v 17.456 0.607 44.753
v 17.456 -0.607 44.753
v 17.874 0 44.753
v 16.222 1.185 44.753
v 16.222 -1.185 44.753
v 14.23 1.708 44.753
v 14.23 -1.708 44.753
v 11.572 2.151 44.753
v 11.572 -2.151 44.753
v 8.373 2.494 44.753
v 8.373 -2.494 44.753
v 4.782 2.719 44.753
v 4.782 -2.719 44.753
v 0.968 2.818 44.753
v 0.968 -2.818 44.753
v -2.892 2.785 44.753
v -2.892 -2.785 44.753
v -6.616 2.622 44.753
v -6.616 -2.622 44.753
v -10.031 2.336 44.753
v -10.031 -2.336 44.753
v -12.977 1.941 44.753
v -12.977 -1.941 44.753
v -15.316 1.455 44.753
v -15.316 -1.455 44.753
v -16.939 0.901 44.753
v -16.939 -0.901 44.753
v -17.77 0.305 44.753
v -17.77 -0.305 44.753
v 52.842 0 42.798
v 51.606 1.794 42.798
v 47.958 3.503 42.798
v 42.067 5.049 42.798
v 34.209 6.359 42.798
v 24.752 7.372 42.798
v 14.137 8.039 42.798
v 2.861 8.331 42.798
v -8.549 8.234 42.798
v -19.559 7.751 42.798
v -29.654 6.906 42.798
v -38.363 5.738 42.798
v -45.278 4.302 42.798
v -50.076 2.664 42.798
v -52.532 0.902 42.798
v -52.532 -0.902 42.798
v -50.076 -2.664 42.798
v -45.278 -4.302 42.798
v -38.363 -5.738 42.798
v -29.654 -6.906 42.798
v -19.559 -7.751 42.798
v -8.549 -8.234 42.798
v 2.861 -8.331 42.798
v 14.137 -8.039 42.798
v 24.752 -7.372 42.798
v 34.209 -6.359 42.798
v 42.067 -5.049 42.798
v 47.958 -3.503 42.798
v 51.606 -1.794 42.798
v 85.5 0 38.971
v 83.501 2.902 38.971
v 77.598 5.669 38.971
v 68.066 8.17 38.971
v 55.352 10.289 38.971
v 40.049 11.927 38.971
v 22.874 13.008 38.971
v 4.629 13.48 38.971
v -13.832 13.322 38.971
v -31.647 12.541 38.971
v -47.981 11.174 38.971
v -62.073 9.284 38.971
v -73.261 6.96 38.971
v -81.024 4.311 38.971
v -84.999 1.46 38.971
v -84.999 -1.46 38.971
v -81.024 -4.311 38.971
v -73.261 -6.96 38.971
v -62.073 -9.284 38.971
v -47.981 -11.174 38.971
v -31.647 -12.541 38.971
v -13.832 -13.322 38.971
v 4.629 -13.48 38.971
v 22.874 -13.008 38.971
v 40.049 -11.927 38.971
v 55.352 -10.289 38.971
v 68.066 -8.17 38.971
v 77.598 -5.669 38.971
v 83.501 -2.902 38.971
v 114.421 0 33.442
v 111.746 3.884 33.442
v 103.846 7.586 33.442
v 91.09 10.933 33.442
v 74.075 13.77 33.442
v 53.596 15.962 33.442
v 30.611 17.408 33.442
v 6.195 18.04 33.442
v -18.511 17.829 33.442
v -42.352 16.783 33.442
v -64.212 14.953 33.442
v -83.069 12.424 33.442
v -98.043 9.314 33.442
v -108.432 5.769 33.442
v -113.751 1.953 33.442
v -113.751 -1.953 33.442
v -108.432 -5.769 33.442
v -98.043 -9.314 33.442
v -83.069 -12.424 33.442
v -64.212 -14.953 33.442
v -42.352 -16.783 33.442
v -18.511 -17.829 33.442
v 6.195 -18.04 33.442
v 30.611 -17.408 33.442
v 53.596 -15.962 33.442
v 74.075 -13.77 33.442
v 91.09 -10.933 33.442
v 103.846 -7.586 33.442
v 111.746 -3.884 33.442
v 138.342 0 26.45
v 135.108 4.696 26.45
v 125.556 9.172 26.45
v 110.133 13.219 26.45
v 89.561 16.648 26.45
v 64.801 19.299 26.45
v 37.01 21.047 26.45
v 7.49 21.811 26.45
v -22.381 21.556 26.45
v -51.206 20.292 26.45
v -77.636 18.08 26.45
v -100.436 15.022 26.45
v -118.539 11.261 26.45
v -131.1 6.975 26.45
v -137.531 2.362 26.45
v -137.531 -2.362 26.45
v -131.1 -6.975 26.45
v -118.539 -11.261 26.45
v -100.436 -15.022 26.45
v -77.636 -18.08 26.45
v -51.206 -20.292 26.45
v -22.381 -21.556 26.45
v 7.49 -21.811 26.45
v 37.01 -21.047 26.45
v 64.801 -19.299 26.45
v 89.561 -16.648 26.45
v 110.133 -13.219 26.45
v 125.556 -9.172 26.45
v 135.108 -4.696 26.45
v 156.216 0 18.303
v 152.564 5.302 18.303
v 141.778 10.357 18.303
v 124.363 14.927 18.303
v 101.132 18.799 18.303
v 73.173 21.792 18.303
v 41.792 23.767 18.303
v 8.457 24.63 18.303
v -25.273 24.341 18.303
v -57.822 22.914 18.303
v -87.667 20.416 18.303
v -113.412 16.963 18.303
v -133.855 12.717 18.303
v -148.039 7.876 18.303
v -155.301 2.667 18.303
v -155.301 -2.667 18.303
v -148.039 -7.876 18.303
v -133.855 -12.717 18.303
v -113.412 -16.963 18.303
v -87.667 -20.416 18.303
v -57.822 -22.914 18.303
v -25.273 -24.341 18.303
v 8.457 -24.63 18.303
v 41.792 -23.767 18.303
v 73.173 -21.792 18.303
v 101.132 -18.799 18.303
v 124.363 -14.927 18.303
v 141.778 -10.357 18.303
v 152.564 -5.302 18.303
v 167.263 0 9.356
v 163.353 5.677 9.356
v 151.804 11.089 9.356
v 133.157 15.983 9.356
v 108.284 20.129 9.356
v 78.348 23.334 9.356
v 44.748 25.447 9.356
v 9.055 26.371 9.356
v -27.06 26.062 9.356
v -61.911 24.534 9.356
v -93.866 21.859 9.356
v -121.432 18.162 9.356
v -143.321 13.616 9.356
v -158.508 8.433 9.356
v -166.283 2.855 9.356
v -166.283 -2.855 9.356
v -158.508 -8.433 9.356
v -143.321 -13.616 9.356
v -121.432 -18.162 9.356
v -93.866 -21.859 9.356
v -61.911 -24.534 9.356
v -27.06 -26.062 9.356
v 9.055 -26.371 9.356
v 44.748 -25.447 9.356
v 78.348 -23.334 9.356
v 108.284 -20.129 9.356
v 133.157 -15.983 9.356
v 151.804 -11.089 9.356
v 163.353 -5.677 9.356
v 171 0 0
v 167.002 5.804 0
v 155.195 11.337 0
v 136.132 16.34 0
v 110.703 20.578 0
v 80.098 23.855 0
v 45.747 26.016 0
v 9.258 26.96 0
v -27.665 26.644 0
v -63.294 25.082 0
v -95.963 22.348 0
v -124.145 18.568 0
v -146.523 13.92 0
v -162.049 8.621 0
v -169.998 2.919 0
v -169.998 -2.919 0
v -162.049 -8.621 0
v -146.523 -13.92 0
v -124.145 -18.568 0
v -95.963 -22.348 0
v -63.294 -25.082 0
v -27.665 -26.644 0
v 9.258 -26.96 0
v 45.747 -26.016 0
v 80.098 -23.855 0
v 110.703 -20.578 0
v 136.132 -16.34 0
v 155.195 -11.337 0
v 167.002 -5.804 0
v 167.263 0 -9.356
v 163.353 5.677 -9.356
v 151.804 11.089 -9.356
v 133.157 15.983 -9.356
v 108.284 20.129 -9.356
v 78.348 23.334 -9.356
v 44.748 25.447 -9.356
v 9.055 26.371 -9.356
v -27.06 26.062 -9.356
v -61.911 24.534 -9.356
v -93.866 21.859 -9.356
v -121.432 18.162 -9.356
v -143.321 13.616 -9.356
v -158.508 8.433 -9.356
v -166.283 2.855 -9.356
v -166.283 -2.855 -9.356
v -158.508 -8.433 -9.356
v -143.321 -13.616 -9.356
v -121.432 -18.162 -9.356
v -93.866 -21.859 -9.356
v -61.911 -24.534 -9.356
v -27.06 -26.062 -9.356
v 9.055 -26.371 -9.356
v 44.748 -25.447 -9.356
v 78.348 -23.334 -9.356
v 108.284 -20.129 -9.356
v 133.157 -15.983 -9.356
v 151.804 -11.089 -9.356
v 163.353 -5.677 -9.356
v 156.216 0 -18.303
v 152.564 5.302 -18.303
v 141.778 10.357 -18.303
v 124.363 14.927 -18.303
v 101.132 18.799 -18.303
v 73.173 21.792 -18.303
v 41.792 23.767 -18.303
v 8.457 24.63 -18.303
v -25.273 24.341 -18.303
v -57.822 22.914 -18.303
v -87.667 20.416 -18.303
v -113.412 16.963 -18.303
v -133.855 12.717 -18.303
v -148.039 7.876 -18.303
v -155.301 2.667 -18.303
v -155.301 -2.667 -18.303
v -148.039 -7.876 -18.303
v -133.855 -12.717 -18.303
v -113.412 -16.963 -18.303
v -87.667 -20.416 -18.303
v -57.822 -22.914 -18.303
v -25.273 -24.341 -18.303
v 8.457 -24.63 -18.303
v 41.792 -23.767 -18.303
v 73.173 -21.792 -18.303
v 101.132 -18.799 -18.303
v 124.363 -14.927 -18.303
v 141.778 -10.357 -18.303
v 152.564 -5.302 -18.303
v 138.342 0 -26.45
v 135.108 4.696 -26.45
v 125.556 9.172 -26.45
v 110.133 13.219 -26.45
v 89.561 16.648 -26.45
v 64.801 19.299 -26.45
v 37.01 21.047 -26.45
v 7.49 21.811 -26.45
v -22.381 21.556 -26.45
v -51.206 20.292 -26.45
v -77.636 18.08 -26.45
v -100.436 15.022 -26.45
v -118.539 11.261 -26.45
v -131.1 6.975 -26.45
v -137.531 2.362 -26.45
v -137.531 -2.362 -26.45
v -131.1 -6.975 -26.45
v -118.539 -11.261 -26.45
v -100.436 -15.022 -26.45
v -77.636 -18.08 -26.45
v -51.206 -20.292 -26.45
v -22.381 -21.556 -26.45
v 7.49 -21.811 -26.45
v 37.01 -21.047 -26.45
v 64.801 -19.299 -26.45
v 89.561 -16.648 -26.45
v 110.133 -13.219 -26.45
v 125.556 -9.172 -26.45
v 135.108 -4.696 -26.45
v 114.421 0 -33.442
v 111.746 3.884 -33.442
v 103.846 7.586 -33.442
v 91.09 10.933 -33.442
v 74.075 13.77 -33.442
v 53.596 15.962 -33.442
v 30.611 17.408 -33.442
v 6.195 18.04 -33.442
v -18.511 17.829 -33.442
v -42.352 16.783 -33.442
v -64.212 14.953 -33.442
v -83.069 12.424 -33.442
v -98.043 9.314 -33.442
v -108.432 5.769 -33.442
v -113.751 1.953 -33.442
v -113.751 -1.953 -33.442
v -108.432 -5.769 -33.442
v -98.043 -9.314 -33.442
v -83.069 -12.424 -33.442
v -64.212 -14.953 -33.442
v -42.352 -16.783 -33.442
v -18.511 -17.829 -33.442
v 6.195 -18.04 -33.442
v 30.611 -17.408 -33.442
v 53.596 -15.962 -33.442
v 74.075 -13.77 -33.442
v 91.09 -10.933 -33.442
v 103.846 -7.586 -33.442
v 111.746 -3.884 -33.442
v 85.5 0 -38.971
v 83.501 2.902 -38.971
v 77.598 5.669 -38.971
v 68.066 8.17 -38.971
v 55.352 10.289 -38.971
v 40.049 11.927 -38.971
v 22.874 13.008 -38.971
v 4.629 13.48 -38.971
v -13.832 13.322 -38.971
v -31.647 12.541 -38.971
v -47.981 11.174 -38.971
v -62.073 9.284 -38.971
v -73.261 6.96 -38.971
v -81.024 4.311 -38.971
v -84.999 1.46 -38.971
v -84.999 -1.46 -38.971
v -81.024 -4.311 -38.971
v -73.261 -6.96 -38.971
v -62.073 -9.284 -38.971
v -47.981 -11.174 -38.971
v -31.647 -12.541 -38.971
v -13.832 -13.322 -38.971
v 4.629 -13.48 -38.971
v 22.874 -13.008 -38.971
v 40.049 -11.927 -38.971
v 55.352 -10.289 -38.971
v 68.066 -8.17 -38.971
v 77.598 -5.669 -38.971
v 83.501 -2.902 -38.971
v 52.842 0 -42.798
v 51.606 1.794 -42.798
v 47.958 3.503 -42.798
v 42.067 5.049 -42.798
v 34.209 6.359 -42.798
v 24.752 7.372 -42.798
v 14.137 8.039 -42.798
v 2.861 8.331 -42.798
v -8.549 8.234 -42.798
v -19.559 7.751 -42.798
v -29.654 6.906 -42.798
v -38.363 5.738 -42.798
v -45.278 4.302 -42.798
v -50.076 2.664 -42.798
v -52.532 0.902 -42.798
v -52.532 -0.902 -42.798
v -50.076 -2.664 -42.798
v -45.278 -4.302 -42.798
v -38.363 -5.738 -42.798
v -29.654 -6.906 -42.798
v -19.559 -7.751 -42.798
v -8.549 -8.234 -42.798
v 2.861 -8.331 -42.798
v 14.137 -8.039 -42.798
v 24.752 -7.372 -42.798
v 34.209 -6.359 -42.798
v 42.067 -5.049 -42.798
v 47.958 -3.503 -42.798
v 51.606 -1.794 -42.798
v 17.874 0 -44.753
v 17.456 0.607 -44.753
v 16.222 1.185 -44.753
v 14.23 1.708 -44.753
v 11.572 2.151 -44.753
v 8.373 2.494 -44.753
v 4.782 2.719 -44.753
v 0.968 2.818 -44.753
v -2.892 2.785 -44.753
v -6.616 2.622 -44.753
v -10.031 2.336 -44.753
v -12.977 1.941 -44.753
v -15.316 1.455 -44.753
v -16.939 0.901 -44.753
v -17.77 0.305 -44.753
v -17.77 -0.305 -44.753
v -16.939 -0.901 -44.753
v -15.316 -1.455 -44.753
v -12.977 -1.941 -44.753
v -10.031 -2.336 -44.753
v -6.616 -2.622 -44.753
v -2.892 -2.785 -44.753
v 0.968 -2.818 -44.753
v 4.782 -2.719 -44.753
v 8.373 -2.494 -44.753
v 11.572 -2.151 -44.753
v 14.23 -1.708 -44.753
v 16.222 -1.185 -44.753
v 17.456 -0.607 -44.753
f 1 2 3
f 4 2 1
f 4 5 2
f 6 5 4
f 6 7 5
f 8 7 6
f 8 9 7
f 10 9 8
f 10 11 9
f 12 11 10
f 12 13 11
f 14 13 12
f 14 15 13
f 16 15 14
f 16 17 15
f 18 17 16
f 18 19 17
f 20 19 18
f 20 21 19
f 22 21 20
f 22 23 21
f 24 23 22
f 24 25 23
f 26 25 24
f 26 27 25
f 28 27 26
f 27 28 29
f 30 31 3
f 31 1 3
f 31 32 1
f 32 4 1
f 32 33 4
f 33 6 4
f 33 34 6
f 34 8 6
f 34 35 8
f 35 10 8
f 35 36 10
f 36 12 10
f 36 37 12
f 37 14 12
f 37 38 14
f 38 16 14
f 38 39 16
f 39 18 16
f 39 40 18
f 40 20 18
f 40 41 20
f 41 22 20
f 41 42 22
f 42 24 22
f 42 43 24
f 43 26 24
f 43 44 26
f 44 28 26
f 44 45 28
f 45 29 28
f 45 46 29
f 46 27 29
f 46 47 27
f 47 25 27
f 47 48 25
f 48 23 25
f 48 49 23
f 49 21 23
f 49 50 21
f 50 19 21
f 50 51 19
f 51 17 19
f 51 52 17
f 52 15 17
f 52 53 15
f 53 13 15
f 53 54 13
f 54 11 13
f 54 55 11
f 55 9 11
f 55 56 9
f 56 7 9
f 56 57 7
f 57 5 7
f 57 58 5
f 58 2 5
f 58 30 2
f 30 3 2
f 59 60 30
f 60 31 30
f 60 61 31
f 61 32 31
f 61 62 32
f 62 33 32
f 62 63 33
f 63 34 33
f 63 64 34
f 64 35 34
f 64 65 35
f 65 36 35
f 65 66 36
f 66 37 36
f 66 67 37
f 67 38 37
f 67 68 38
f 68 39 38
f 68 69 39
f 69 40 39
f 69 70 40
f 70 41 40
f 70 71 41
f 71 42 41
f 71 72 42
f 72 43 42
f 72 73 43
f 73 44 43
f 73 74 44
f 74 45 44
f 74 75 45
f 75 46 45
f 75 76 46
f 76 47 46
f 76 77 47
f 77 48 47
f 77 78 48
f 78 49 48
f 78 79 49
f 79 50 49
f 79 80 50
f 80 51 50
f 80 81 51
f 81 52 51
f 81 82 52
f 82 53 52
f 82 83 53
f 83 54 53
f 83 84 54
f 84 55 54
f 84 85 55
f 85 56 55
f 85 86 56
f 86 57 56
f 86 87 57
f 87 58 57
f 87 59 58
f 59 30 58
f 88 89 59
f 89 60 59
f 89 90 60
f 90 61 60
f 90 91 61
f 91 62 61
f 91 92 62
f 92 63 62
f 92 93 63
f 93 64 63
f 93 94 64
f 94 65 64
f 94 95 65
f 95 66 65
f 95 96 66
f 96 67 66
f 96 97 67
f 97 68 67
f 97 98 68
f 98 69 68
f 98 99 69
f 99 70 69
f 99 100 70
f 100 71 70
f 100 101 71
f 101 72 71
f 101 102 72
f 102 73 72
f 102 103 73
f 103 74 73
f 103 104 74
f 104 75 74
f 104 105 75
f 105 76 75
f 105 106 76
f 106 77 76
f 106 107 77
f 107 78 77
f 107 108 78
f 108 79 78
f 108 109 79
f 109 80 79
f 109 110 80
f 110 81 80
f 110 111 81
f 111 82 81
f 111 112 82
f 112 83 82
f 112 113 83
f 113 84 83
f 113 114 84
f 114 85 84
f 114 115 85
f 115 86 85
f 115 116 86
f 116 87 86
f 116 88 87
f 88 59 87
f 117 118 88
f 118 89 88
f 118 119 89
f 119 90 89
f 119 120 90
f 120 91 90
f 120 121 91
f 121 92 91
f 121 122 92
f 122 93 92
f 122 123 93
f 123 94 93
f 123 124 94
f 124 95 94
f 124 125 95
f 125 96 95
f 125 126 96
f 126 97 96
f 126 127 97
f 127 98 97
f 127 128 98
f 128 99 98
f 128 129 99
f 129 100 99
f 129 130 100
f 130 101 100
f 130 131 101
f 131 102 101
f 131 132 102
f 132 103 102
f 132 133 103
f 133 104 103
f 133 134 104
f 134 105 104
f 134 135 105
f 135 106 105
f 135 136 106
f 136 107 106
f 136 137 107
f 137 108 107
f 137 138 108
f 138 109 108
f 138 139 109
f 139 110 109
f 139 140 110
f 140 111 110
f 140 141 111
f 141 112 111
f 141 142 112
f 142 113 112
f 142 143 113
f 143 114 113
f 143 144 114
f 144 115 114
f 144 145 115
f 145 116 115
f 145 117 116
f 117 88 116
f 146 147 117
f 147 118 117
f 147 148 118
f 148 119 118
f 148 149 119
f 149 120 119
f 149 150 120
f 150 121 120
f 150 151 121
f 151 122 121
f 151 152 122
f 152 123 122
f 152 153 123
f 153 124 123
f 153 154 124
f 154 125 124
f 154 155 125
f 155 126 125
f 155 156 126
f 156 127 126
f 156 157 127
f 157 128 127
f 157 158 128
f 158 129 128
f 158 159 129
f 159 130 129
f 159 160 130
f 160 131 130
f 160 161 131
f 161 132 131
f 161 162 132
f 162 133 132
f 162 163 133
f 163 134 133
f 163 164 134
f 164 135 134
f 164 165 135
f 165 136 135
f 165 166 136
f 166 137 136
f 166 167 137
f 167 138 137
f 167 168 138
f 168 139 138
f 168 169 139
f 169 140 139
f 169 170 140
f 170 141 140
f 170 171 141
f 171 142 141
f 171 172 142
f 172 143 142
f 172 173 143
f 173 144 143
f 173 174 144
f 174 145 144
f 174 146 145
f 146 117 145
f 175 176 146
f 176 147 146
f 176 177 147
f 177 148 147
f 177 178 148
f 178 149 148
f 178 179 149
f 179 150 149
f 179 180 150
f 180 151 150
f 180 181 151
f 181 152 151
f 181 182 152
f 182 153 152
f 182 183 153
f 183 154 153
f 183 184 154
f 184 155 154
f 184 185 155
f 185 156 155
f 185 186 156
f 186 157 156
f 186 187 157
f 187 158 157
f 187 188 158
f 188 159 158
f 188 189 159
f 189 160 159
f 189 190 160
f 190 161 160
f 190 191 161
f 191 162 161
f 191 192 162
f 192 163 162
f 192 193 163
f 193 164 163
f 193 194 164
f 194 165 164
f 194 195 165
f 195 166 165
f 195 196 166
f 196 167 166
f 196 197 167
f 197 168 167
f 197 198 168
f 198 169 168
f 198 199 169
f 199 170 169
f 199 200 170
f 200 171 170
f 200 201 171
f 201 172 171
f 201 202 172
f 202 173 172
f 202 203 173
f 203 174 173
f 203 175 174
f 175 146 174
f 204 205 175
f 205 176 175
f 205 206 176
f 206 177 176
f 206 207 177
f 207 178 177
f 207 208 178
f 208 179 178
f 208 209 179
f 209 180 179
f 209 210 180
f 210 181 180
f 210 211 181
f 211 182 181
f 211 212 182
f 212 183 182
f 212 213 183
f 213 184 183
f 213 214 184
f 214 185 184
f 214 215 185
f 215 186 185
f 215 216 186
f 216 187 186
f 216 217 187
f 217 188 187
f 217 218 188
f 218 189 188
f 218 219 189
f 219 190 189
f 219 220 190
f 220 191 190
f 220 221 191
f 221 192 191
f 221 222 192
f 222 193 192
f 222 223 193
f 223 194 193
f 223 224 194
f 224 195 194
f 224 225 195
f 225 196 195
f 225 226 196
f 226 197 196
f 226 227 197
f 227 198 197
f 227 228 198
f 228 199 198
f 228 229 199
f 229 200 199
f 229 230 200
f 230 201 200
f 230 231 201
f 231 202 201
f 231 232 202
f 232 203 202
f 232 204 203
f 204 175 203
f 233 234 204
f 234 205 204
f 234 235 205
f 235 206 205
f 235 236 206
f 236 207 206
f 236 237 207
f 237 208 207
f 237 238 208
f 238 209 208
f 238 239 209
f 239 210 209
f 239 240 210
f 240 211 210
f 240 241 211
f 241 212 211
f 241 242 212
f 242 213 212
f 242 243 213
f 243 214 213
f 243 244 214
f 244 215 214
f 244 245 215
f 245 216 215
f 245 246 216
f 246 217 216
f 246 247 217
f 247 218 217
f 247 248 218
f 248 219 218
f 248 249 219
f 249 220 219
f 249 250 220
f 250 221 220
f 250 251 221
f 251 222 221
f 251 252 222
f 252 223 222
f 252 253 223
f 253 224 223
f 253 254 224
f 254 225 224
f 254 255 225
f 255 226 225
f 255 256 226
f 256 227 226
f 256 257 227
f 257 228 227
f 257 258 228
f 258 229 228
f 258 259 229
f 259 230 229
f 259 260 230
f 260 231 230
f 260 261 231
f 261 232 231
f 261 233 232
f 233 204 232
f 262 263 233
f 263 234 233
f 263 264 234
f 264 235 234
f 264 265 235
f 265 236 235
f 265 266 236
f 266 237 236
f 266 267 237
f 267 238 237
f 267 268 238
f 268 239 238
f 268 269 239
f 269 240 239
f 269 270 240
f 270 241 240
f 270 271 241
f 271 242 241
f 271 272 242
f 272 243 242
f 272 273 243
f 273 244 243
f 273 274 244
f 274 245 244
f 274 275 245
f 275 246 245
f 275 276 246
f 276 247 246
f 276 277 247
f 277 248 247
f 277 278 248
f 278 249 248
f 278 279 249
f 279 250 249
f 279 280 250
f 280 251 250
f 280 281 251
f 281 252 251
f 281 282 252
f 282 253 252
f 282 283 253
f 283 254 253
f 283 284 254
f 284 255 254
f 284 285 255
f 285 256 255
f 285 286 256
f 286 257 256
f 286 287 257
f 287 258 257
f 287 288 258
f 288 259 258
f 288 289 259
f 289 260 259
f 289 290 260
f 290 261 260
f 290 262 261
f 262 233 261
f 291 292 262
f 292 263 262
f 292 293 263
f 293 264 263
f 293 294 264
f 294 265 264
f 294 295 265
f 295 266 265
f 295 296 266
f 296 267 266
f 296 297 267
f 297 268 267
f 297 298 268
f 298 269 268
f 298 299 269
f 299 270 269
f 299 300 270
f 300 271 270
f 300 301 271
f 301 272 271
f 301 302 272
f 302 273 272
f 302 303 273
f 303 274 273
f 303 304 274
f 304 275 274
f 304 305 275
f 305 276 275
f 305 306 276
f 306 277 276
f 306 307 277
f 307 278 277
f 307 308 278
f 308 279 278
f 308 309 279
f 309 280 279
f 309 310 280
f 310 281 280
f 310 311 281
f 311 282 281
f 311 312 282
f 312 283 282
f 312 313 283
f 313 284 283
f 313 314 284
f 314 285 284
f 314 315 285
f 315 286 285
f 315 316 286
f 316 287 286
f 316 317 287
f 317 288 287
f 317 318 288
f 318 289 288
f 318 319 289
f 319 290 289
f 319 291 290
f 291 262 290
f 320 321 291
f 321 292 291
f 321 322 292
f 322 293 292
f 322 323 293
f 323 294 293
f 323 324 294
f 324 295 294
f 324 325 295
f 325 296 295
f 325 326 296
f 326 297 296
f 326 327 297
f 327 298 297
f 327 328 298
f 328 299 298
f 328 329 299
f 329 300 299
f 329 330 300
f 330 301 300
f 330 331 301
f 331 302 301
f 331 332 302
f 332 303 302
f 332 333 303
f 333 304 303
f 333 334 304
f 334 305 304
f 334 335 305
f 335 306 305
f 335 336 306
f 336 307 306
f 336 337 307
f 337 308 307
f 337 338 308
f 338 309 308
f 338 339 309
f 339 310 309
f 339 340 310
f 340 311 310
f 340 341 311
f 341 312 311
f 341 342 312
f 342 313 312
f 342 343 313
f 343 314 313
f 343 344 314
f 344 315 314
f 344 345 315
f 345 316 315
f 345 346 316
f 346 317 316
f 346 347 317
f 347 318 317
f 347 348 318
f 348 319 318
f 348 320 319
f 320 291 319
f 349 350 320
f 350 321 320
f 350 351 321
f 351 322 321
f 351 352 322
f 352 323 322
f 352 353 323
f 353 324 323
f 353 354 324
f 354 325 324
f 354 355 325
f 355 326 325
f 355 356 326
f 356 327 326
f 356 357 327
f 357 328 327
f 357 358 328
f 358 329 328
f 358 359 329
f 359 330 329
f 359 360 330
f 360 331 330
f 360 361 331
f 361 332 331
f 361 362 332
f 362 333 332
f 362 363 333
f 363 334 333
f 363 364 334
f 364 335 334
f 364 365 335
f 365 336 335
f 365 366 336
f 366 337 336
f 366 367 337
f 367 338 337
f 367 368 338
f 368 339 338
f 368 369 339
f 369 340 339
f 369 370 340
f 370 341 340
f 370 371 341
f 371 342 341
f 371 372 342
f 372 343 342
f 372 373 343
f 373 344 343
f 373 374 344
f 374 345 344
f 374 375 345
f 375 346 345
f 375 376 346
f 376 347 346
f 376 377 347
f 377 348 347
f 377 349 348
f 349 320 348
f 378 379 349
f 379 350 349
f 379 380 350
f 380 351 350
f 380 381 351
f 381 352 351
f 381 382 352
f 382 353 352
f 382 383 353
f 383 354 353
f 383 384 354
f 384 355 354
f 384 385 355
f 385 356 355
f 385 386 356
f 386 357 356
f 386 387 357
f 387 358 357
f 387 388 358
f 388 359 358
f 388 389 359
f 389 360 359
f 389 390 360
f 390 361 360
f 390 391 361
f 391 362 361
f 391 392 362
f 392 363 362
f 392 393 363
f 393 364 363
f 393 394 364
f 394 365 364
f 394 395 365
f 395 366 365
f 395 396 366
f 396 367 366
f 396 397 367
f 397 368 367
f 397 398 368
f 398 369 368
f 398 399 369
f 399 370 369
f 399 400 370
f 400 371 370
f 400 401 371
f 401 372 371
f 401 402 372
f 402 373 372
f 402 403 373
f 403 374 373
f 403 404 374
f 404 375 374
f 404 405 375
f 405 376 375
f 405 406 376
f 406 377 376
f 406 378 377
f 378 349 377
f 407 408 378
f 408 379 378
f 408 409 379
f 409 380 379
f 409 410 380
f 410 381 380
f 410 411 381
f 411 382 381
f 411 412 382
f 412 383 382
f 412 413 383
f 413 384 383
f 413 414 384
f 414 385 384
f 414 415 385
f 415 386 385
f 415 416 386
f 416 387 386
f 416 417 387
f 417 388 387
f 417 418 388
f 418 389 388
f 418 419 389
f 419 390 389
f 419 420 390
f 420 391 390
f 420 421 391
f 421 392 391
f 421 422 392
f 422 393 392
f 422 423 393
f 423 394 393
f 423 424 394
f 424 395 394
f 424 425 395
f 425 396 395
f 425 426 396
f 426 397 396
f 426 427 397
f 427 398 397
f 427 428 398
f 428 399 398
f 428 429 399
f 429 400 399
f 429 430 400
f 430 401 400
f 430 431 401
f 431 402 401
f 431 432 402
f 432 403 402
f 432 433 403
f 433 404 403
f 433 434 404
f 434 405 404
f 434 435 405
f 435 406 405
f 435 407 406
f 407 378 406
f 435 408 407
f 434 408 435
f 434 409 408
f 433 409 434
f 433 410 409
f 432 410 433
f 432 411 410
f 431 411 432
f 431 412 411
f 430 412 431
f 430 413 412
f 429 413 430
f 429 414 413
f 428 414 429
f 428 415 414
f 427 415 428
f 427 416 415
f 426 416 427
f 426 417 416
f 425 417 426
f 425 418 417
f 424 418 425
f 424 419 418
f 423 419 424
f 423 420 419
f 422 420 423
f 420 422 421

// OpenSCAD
// Generated by SolidPython 1.0.1 on 2020-07-29 00:46:53


scale(v = [19, 3, 5]) {
	sphere(r = 9);
}
/***********************************************
*********      SolidPython code:      **********
************************************************
 
# import packages: SolidPython
from solid import *
from solid.utils import *
from itertools import chain, combinations, permutations


class Resize:

    def __init__(self, scad_file):
        self.scad_file = scad_file
        #self.scad_file = import_scad(scad_file)
        # cone/cylinder param:
        self.r1 = 0
        self.r2 = 0
        self.h = 0
        # rectangular prism param:
        self.w = 0
        self.l = 0
        # ellipse param:
        self.r = 0

    # import OpenScad code (file name corresponds to shape)


    # classify shape + parameters
    def assign(self, param1, param2, param3):
        if self.scad_file == 'cone.scad':
            self.r1 = param1
            self.r2 = param2
            self.h = param3
        elif self.scad_file == 'cylinder.scad':
            self.r1 = param1
            self.r2 = param2
            self.h = param3
        elif self.scad_file == 'rectangularPrism.scad':
            self.h = param1
            self.l = param2
            self.w = param3
        else:
            self.r = param1
            self.h = param2

    # resize parameters
    def iterate(self):
        x = range(3, 20, 2)
        i = 1
        if self.scad_file == 'cone.scad':
            tempList = list(permutations(x, 2))
            for temp in tempList:
                param1 = temp[0]
                param2 = temp[1]
                filepath = 'produced_scad_files/' + 'cone' + str(param1) + '_' + str(param2) + '_' + '.scad'
                scad_render_to_file(cylinder(h=param1, r1=param2, r2=0), filepath)

        elif self.scad_file == 'cylinder.scad':
            tempList = list(permutations(x, 3))
            for temp in tempList:
                param1 = temp[0]
                param2 = temp[1]
                filepath = 'produced_scad_files/' + 'cylinder' + str(param1) + '_' + str(param2) + '_' + '.scad'
                scad_render_to_file(cylinder(h=param1, r1=param2, r2=param2), filepath)

        elif self.scad_file == 'rectangularPrism.scad':
            tempList = list(permutations(x, 3))
            for temp in tempList:
                param1 = temp[0]
                param2 = temp[1]
                param3 = temp[2]
                filepath = 'produced_scad_files/' + 'rectangularPrism' + str(param1) + '_' + str(param2) + '_' + str(
                    param3) + '.scad'
                scad_render_to_file(cube(size=(param1, param2, param3)), filepath)

        elif self.scad_file == 'ellipse.scad':
            tempList = list(permutations(x, 4))
            for temp in tempList:
                param1 = temp[0]
                param2 = temp[1]
                param3 = temp[2]
                param4 = temp[3]
                filepath = 'produced_scad_files/' + 'ellipse' + str(param1) + '_' + str(param2) + '_' + str(param3) + '_' + str(param4) + '.scad'
                scad_render_to_file(scale([param1, param2, param3])(sphere(r=param4)), filepath)

    def render_to_scadfile(self):
        scad_render_to_file(scad, 'example.scad') 
 
************************************************/
